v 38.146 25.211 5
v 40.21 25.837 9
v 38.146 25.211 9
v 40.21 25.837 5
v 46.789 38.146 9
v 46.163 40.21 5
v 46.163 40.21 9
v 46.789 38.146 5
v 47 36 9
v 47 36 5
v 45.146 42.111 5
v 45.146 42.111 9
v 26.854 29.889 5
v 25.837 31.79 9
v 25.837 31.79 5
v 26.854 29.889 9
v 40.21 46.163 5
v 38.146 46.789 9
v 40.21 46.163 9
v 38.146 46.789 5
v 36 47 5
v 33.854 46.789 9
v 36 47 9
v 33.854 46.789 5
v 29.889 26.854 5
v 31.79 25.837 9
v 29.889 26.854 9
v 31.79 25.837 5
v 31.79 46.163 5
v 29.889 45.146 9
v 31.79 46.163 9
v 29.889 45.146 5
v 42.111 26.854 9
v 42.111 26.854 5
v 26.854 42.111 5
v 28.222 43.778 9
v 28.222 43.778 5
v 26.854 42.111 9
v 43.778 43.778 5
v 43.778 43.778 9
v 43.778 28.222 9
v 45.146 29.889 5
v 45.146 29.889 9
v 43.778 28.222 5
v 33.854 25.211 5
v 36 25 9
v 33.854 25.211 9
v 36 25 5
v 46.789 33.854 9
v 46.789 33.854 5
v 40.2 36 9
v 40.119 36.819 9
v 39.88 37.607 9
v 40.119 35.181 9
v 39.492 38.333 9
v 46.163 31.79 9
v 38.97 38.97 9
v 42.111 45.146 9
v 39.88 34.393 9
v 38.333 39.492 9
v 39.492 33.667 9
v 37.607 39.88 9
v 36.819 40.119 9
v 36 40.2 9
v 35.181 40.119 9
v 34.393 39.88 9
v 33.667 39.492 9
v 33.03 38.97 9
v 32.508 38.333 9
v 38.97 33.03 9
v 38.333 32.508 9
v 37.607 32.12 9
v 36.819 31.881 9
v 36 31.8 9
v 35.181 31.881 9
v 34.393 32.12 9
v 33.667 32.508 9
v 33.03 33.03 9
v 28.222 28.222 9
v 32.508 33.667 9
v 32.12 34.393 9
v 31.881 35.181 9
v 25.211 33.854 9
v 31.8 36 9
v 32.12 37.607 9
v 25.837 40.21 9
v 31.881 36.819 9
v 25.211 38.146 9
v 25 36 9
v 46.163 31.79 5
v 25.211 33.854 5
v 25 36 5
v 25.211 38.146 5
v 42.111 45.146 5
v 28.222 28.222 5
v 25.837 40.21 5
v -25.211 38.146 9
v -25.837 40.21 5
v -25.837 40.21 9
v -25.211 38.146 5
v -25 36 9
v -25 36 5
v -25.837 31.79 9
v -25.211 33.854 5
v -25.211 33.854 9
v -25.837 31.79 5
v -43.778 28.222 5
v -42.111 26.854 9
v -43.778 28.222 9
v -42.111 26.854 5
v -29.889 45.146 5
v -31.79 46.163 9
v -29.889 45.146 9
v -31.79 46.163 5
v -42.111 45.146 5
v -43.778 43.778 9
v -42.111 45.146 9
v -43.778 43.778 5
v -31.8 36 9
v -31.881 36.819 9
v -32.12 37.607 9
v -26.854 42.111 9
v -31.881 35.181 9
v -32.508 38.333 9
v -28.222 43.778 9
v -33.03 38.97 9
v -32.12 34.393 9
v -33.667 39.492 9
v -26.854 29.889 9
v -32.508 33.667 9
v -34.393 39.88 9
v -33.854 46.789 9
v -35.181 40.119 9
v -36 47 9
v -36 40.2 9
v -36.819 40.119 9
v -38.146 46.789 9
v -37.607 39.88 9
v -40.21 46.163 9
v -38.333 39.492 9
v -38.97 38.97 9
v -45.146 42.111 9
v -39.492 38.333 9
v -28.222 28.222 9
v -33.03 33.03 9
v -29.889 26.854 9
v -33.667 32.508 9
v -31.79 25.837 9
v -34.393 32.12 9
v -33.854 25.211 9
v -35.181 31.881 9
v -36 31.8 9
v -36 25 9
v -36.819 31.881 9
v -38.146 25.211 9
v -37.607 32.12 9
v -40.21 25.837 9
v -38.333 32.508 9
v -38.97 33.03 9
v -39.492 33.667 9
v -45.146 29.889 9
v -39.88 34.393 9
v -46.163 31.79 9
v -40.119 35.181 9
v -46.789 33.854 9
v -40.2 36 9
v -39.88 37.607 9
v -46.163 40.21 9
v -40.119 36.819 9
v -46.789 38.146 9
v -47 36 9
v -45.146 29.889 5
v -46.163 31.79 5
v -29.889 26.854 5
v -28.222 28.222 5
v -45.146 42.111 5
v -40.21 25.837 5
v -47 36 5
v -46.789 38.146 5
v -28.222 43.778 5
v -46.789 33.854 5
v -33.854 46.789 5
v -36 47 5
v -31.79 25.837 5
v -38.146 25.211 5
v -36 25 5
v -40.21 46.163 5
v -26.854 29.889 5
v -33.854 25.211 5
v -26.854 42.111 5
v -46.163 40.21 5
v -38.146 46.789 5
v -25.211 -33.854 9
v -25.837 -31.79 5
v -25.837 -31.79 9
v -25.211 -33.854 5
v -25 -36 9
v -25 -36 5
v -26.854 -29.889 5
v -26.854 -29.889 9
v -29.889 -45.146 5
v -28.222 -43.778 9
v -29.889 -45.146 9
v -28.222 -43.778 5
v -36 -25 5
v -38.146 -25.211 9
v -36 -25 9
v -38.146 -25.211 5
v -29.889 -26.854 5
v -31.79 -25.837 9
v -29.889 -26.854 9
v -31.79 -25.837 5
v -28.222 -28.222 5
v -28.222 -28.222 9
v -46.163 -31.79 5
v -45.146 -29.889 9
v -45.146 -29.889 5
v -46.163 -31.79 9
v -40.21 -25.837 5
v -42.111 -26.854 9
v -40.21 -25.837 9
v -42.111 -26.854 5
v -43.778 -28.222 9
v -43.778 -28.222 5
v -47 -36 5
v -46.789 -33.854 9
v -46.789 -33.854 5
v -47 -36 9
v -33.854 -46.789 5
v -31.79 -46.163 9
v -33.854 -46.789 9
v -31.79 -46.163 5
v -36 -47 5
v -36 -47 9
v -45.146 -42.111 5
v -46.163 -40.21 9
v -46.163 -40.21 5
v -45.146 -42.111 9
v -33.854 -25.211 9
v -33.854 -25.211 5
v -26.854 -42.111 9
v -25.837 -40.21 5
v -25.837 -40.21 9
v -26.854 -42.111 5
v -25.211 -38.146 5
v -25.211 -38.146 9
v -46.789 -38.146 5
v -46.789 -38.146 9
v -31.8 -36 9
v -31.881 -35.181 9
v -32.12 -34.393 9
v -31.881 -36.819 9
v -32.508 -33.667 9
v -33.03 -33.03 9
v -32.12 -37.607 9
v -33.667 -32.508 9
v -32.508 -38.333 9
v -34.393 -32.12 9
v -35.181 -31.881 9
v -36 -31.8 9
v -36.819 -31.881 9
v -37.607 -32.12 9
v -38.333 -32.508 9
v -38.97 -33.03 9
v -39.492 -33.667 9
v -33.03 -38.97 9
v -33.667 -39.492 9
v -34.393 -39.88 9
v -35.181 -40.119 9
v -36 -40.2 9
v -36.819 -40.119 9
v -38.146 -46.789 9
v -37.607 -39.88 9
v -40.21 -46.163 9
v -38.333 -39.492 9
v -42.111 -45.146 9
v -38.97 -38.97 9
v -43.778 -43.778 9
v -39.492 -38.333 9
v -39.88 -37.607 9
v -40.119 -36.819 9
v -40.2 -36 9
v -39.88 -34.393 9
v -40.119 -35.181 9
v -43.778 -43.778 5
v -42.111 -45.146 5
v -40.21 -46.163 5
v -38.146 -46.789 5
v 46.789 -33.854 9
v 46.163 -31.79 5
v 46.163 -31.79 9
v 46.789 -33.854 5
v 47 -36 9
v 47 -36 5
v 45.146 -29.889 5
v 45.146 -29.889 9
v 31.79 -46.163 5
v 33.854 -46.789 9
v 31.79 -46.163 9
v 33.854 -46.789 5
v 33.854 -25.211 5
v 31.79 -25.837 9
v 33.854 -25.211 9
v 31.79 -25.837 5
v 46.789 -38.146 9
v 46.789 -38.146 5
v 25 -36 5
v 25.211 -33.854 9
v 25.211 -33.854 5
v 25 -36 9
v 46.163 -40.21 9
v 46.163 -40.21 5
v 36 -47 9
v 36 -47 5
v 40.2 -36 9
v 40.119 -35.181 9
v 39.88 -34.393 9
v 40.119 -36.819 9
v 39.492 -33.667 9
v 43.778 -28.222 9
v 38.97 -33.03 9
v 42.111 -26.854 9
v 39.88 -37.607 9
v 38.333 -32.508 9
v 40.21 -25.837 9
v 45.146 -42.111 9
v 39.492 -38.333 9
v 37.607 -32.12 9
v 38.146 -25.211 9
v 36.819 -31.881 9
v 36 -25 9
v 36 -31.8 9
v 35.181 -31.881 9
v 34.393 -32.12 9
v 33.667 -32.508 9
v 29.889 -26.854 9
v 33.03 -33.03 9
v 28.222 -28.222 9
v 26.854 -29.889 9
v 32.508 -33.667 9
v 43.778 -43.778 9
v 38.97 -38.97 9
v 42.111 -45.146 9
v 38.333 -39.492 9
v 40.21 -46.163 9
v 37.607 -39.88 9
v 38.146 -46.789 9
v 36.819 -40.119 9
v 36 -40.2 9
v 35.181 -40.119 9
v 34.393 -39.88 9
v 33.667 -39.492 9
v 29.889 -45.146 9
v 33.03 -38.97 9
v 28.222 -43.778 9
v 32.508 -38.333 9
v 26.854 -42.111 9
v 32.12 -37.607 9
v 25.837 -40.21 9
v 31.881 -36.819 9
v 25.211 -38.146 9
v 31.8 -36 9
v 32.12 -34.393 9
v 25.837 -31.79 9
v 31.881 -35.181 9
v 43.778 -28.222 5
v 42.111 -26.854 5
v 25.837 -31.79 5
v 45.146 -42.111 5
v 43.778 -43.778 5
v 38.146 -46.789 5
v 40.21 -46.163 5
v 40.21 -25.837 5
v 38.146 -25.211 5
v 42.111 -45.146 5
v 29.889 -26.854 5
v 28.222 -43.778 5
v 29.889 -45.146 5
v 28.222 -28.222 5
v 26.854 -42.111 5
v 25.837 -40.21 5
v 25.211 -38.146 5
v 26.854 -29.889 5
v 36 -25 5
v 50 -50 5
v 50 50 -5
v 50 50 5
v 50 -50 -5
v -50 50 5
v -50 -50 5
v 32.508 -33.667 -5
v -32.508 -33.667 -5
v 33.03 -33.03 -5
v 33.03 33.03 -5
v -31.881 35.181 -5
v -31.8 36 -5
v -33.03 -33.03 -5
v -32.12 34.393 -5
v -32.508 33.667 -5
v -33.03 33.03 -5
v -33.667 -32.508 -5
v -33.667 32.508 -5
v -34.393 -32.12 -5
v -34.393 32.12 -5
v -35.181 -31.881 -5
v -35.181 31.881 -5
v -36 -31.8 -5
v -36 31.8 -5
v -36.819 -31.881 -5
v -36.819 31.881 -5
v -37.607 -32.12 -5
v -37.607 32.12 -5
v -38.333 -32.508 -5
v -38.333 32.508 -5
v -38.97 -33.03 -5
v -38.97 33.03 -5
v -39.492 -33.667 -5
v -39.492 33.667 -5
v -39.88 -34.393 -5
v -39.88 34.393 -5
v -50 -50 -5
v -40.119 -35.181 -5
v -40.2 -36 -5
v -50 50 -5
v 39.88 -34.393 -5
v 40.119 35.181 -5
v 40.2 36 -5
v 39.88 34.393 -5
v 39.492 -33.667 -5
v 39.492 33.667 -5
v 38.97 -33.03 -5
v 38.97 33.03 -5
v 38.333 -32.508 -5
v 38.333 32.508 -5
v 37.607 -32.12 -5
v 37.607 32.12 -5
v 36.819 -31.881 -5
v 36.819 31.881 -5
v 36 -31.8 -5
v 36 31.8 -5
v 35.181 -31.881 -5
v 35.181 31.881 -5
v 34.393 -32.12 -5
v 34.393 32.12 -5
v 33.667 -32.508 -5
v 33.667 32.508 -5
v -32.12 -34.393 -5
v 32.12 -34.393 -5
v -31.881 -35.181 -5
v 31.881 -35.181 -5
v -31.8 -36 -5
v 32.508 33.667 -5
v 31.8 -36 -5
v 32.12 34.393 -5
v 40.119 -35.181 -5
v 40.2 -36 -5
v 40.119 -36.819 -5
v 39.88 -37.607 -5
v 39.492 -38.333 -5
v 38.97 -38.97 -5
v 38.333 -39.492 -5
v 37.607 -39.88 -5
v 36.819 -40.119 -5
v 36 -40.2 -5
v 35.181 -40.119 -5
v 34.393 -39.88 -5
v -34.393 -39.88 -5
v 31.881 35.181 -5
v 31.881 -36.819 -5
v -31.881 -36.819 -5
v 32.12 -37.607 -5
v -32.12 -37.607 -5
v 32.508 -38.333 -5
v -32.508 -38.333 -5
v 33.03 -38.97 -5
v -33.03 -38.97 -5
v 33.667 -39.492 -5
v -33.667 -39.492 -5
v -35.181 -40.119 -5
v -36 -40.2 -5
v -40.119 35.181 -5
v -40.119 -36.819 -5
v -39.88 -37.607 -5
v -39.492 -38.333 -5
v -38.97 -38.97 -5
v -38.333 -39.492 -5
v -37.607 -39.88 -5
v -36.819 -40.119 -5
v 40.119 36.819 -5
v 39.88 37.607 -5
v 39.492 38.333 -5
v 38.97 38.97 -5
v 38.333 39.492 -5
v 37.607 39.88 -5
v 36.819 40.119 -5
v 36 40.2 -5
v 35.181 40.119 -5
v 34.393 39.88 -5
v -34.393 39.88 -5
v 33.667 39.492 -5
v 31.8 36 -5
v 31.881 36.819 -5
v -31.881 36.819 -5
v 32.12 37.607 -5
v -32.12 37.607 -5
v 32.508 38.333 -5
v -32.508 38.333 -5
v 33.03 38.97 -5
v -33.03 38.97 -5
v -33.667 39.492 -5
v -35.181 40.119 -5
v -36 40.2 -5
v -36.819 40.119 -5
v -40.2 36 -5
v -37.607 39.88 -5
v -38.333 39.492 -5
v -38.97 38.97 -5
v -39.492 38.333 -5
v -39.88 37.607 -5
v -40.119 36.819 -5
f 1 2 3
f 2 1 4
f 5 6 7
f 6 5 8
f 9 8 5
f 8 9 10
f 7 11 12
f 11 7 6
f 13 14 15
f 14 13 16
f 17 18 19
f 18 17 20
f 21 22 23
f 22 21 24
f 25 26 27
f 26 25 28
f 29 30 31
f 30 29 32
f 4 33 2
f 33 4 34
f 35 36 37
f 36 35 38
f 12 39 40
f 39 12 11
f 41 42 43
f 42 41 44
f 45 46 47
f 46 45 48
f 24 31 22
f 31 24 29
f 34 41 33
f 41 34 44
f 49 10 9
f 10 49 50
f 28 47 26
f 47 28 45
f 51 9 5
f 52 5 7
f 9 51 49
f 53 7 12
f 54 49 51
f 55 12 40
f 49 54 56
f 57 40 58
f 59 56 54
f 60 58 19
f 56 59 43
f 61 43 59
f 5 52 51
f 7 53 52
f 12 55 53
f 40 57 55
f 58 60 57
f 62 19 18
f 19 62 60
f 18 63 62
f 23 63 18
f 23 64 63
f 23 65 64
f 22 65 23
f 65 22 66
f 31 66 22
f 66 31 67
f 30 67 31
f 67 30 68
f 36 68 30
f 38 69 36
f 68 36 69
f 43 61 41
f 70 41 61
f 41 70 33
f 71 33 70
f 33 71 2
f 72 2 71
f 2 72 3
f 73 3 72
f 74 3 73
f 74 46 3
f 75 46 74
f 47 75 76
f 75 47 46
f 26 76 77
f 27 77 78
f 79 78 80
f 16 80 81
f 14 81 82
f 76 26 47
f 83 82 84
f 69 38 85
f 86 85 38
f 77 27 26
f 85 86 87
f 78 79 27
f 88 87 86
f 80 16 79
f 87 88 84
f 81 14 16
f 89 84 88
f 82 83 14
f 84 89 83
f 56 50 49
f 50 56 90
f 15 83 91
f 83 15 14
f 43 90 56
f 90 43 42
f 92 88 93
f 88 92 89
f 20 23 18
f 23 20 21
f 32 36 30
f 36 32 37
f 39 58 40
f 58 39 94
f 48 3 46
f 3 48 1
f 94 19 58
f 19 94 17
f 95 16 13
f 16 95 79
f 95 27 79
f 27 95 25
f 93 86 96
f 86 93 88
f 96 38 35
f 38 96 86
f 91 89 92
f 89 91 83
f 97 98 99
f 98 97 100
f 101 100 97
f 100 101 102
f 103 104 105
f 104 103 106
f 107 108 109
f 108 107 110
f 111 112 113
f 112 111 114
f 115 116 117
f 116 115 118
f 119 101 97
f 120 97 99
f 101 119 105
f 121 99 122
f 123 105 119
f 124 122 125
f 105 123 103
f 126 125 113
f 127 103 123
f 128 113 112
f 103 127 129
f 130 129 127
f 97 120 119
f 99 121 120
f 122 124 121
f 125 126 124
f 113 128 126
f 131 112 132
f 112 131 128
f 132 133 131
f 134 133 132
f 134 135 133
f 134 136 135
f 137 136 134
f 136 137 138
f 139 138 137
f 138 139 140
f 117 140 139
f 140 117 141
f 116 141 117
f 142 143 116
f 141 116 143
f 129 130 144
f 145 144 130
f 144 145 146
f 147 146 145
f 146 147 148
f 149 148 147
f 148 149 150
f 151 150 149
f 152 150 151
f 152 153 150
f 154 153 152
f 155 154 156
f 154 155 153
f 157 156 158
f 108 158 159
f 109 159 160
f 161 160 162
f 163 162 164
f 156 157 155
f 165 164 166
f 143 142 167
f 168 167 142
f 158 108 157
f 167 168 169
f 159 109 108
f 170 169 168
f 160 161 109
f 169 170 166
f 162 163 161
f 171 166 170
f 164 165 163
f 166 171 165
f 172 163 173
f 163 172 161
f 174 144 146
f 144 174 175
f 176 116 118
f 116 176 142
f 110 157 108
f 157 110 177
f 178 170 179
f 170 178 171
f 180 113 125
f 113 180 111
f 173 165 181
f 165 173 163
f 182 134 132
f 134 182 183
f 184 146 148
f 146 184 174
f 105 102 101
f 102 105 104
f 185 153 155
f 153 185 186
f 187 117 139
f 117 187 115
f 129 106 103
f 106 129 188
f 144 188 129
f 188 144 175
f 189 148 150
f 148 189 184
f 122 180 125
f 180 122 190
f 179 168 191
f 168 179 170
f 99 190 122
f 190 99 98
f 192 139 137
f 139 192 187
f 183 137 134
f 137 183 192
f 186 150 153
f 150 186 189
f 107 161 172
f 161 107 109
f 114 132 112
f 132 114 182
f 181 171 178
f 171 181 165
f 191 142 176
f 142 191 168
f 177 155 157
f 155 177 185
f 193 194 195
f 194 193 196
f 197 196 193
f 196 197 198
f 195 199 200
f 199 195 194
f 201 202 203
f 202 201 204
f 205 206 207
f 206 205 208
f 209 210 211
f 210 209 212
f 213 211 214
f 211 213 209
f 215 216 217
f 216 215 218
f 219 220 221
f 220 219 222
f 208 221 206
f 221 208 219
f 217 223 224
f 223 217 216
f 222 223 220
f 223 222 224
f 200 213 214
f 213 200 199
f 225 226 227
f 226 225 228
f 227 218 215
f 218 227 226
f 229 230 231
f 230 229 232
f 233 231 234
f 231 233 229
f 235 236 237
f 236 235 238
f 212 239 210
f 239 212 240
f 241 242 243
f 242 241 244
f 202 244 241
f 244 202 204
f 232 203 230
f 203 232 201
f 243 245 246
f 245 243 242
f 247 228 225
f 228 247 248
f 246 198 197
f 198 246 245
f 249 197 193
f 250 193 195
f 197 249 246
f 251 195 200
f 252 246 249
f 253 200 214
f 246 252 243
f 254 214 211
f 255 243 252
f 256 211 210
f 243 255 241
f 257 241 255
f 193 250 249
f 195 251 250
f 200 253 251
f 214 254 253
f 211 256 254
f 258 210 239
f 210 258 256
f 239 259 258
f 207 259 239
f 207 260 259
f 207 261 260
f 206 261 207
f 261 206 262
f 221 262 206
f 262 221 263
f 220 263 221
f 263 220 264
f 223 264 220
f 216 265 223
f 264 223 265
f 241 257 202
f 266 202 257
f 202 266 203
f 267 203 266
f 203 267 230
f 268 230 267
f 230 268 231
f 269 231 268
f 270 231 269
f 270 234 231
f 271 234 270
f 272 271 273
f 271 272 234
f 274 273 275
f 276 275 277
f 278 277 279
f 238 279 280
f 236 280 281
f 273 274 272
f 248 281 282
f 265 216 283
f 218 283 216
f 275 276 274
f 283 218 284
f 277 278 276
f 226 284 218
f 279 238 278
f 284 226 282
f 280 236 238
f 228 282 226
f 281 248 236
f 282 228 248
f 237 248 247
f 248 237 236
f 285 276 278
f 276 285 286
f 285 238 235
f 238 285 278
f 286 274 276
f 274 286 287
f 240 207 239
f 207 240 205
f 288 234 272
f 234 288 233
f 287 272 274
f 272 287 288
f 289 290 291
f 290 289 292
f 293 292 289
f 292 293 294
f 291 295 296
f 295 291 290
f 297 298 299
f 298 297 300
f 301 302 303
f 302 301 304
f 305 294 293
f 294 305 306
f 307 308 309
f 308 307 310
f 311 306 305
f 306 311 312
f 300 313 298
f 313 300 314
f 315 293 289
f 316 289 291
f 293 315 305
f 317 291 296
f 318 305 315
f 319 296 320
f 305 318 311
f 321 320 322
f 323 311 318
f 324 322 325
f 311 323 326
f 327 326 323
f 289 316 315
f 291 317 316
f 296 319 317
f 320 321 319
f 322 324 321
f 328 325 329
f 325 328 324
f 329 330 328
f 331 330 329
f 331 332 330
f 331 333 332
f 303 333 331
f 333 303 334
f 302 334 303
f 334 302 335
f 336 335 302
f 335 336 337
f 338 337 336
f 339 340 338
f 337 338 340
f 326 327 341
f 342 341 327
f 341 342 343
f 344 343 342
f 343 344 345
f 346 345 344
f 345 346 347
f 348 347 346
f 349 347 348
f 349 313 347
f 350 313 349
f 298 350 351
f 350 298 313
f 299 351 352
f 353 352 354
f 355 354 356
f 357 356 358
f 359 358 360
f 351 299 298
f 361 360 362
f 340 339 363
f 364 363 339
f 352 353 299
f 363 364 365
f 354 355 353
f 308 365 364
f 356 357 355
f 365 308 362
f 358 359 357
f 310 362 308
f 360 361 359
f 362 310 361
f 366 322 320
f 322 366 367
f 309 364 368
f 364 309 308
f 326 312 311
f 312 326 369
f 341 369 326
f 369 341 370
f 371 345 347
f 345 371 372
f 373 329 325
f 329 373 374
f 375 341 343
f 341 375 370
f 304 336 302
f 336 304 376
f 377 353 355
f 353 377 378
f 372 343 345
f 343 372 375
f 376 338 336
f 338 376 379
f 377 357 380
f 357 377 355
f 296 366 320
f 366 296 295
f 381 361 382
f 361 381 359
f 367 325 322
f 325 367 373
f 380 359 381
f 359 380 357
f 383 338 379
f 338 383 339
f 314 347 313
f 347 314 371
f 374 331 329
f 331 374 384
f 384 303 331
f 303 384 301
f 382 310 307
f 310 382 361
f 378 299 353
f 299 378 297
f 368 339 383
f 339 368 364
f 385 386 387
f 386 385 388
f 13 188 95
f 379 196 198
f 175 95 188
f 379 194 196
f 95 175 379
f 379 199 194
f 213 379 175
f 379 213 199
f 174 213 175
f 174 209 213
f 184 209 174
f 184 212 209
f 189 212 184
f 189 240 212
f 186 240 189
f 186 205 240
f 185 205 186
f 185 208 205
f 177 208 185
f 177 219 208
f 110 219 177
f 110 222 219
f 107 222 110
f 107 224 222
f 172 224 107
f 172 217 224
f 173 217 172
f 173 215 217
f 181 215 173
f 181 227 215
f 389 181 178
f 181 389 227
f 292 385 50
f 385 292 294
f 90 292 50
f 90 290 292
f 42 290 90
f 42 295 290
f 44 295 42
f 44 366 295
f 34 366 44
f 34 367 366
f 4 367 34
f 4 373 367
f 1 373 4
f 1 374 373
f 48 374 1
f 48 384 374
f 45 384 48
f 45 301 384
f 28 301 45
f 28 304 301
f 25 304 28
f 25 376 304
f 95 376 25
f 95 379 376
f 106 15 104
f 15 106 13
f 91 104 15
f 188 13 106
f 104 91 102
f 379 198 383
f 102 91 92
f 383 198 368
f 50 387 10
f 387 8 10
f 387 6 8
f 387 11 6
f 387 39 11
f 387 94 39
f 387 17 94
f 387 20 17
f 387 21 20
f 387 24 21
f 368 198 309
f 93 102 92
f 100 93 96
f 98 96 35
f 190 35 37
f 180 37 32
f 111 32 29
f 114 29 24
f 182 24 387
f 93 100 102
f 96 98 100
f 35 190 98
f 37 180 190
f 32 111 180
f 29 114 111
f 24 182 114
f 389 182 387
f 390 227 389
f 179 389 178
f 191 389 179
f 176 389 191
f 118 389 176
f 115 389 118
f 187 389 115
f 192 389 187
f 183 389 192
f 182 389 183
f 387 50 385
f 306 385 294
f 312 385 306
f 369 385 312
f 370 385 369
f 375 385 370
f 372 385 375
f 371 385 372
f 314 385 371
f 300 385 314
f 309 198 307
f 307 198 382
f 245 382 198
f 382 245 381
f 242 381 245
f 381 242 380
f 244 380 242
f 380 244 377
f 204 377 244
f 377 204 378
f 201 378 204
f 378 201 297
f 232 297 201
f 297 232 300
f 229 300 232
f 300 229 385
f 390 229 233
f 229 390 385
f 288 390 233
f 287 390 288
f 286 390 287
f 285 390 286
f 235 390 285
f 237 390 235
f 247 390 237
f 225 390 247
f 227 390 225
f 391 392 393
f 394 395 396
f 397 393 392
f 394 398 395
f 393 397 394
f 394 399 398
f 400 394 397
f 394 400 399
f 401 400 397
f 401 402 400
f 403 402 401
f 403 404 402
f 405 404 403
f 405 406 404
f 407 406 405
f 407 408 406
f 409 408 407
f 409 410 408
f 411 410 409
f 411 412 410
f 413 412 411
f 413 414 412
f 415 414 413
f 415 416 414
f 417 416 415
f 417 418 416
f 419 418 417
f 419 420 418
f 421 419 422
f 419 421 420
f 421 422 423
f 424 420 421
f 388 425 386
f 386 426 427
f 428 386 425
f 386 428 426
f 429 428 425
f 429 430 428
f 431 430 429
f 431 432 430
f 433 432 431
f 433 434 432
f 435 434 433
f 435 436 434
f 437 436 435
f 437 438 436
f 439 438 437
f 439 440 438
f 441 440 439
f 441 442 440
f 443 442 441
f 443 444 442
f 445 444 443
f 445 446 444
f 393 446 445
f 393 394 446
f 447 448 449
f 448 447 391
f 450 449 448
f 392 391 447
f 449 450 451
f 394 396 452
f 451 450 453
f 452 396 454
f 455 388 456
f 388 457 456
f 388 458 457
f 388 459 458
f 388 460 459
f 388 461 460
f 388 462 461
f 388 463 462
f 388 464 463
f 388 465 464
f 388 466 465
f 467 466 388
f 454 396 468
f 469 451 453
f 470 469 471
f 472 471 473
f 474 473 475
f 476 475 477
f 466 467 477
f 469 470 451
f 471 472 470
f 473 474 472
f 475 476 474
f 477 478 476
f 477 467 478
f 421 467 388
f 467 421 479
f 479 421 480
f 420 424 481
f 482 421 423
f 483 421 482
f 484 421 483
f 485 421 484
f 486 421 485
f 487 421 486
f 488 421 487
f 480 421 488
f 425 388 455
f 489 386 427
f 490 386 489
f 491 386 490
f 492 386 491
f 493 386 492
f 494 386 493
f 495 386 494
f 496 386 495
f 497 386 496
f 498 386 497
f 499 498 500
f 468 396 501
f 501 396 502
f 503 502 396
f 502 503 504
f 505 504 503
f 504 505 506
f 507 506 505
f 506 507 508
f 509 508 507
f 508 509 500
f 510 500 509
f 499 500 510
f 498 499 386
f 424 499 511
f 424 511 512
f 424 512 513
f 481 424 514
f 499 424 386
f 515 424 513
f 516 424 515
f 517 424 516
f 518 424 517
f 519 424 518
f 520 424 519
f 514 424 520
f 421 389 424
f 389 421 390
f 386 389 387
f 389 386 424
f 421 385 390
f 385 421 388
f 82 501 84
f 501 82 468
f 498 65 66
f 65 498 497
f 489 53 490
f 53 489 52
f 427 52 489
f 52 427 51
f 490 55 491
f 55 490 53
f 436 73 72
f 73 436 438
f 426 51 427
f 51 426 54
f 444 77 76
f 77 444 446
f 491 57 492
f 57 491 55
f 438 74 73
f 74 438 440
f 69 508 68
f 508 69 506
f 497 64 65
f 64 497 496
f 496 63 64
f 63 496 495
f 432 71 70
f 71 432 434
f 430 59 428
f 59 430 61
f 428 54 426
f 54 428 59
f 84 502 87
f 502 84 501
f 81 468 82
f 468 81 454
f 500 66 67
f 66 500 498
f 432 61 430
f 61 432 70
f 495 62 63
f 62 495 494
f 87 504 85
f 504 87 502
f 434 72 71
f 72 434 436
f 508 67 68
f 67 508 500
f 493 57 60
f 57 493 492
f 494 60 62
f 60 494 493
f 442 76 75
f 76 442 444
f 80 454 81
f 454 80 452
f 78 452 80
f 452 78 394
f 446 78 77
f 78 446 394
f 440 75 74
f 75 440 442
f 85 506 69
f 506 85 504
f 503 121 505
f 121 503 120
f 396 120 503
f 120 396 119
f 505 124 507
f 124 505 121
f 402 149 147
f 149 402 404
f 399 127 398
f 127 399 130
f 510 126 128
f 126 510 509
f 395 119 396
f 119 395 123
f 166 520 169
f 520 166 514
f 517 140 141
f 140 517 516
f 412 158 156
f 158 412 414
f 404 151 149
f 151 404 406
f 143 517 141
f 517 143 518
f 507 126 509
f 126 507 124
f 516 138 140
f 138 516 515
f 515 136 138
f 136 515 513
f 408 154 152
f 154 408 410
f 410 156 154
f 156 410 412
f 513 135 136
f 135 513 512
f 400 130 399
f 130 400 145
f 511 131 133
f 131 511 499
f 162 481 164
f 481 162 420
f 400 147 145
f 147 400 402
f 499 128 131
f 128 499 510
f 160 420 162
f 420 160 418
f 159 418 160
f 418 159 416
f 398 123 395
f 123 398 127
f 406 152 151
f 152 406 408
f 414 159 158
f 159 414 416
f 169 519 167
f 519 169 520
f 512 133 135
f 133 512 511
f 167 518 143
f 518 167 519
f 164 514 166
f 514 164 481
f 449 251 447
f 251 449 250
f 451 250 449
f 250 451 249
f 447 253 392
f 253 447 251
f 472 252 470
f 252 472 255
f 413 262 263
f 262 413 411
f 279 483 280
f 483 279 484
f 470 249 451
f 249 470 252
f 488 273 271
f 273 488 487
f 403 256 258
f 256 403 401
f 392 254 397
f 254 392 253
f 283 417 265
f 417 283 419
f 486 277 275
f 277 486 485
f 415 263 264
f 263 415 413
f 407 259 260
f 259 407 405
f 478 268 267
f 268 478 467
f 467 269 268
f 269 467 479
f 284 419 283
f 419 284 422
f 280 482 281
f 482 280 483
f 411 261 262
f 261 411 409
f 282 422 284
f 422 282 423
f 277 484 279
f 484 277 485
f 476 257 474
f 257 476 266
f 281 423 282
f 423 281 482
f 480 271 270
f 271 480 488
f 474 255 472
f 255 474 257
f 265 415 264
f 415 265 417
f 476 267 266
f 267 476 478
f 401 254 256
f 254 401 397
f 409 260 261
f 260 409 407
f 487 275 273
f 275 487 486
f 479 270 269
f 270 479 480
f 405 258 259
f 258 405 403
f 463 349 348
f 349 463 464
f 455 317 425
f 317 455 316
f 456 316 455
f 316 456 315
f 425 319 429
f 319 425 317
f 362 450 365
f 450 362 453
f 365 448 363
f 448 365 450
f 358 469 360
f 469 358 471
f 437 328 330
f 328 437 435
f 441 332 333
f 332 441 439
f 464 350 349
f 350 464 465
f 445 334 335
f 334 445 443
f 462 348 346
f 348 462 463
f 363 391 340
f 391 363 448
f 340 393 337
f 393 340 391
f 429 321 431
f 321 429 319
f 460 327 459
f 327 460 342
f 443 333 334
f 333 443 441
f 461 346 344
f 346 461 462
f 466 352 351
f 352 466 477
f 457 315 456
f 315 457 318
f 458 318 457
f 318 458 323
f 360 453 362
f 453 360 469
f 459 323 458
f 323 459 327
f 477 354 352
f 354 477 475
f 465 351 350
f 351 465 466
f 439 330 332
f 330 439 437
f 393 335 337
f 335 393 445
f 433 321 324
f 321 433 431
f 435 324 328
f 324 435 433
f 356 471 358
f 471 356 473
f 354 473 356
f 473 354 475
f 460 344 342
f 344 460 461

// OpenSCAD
$fn = 32;

// ----------------------------------------------------------------------
// Anchor pads 100 x 100 x 14
// four corner bosses with anchor holes
// ----------------------------------------------------------------------

// --- parameters (mm) ---
plate = [100, 100, 10];  // base plate size (x, y, z)
pads = 4;                // boss count, one per corner
edge = 14;               // boss centre offset from the plate edge
boss_d = 22;             // boss diameter
boss_h = 4;              // boss height above the base plate
hole_d = 8.4;            // hole diameter

// --- derived feature positions (mm) ---
height = plate[2] + boss_h;      // = 14   overall height of the part
corner_x = plate[0] / 2 - edge;  // = 36   boss centre X
corner_y = plate[1] / 2 - edge;  // = 36   boss centre Y
feature_centers = [
  [corner_x, corner_y],
  [-corner_x, corner_y],
  [-corner_x, -corner_y],
  [corner_x, -corner_y]
];   // boss centres, anchor holes are drilled there

// base plate, four bosses standing on it, anchor holes all the way through
difference() {
  union() {
    cube(plate, center = true);
    for (centre = feature_centers)
      translate([centre[0], centre[1], plate[2] / 2 - 1])
        cylinder(d = boss_d, h = boss_h + 1);
  }
  for (centre = feature_centers)
    translate([centre[0], centre[1], -height])
      cylinder(d = hole_d, h = 2 * height + 2);  // through boss and plate
}
